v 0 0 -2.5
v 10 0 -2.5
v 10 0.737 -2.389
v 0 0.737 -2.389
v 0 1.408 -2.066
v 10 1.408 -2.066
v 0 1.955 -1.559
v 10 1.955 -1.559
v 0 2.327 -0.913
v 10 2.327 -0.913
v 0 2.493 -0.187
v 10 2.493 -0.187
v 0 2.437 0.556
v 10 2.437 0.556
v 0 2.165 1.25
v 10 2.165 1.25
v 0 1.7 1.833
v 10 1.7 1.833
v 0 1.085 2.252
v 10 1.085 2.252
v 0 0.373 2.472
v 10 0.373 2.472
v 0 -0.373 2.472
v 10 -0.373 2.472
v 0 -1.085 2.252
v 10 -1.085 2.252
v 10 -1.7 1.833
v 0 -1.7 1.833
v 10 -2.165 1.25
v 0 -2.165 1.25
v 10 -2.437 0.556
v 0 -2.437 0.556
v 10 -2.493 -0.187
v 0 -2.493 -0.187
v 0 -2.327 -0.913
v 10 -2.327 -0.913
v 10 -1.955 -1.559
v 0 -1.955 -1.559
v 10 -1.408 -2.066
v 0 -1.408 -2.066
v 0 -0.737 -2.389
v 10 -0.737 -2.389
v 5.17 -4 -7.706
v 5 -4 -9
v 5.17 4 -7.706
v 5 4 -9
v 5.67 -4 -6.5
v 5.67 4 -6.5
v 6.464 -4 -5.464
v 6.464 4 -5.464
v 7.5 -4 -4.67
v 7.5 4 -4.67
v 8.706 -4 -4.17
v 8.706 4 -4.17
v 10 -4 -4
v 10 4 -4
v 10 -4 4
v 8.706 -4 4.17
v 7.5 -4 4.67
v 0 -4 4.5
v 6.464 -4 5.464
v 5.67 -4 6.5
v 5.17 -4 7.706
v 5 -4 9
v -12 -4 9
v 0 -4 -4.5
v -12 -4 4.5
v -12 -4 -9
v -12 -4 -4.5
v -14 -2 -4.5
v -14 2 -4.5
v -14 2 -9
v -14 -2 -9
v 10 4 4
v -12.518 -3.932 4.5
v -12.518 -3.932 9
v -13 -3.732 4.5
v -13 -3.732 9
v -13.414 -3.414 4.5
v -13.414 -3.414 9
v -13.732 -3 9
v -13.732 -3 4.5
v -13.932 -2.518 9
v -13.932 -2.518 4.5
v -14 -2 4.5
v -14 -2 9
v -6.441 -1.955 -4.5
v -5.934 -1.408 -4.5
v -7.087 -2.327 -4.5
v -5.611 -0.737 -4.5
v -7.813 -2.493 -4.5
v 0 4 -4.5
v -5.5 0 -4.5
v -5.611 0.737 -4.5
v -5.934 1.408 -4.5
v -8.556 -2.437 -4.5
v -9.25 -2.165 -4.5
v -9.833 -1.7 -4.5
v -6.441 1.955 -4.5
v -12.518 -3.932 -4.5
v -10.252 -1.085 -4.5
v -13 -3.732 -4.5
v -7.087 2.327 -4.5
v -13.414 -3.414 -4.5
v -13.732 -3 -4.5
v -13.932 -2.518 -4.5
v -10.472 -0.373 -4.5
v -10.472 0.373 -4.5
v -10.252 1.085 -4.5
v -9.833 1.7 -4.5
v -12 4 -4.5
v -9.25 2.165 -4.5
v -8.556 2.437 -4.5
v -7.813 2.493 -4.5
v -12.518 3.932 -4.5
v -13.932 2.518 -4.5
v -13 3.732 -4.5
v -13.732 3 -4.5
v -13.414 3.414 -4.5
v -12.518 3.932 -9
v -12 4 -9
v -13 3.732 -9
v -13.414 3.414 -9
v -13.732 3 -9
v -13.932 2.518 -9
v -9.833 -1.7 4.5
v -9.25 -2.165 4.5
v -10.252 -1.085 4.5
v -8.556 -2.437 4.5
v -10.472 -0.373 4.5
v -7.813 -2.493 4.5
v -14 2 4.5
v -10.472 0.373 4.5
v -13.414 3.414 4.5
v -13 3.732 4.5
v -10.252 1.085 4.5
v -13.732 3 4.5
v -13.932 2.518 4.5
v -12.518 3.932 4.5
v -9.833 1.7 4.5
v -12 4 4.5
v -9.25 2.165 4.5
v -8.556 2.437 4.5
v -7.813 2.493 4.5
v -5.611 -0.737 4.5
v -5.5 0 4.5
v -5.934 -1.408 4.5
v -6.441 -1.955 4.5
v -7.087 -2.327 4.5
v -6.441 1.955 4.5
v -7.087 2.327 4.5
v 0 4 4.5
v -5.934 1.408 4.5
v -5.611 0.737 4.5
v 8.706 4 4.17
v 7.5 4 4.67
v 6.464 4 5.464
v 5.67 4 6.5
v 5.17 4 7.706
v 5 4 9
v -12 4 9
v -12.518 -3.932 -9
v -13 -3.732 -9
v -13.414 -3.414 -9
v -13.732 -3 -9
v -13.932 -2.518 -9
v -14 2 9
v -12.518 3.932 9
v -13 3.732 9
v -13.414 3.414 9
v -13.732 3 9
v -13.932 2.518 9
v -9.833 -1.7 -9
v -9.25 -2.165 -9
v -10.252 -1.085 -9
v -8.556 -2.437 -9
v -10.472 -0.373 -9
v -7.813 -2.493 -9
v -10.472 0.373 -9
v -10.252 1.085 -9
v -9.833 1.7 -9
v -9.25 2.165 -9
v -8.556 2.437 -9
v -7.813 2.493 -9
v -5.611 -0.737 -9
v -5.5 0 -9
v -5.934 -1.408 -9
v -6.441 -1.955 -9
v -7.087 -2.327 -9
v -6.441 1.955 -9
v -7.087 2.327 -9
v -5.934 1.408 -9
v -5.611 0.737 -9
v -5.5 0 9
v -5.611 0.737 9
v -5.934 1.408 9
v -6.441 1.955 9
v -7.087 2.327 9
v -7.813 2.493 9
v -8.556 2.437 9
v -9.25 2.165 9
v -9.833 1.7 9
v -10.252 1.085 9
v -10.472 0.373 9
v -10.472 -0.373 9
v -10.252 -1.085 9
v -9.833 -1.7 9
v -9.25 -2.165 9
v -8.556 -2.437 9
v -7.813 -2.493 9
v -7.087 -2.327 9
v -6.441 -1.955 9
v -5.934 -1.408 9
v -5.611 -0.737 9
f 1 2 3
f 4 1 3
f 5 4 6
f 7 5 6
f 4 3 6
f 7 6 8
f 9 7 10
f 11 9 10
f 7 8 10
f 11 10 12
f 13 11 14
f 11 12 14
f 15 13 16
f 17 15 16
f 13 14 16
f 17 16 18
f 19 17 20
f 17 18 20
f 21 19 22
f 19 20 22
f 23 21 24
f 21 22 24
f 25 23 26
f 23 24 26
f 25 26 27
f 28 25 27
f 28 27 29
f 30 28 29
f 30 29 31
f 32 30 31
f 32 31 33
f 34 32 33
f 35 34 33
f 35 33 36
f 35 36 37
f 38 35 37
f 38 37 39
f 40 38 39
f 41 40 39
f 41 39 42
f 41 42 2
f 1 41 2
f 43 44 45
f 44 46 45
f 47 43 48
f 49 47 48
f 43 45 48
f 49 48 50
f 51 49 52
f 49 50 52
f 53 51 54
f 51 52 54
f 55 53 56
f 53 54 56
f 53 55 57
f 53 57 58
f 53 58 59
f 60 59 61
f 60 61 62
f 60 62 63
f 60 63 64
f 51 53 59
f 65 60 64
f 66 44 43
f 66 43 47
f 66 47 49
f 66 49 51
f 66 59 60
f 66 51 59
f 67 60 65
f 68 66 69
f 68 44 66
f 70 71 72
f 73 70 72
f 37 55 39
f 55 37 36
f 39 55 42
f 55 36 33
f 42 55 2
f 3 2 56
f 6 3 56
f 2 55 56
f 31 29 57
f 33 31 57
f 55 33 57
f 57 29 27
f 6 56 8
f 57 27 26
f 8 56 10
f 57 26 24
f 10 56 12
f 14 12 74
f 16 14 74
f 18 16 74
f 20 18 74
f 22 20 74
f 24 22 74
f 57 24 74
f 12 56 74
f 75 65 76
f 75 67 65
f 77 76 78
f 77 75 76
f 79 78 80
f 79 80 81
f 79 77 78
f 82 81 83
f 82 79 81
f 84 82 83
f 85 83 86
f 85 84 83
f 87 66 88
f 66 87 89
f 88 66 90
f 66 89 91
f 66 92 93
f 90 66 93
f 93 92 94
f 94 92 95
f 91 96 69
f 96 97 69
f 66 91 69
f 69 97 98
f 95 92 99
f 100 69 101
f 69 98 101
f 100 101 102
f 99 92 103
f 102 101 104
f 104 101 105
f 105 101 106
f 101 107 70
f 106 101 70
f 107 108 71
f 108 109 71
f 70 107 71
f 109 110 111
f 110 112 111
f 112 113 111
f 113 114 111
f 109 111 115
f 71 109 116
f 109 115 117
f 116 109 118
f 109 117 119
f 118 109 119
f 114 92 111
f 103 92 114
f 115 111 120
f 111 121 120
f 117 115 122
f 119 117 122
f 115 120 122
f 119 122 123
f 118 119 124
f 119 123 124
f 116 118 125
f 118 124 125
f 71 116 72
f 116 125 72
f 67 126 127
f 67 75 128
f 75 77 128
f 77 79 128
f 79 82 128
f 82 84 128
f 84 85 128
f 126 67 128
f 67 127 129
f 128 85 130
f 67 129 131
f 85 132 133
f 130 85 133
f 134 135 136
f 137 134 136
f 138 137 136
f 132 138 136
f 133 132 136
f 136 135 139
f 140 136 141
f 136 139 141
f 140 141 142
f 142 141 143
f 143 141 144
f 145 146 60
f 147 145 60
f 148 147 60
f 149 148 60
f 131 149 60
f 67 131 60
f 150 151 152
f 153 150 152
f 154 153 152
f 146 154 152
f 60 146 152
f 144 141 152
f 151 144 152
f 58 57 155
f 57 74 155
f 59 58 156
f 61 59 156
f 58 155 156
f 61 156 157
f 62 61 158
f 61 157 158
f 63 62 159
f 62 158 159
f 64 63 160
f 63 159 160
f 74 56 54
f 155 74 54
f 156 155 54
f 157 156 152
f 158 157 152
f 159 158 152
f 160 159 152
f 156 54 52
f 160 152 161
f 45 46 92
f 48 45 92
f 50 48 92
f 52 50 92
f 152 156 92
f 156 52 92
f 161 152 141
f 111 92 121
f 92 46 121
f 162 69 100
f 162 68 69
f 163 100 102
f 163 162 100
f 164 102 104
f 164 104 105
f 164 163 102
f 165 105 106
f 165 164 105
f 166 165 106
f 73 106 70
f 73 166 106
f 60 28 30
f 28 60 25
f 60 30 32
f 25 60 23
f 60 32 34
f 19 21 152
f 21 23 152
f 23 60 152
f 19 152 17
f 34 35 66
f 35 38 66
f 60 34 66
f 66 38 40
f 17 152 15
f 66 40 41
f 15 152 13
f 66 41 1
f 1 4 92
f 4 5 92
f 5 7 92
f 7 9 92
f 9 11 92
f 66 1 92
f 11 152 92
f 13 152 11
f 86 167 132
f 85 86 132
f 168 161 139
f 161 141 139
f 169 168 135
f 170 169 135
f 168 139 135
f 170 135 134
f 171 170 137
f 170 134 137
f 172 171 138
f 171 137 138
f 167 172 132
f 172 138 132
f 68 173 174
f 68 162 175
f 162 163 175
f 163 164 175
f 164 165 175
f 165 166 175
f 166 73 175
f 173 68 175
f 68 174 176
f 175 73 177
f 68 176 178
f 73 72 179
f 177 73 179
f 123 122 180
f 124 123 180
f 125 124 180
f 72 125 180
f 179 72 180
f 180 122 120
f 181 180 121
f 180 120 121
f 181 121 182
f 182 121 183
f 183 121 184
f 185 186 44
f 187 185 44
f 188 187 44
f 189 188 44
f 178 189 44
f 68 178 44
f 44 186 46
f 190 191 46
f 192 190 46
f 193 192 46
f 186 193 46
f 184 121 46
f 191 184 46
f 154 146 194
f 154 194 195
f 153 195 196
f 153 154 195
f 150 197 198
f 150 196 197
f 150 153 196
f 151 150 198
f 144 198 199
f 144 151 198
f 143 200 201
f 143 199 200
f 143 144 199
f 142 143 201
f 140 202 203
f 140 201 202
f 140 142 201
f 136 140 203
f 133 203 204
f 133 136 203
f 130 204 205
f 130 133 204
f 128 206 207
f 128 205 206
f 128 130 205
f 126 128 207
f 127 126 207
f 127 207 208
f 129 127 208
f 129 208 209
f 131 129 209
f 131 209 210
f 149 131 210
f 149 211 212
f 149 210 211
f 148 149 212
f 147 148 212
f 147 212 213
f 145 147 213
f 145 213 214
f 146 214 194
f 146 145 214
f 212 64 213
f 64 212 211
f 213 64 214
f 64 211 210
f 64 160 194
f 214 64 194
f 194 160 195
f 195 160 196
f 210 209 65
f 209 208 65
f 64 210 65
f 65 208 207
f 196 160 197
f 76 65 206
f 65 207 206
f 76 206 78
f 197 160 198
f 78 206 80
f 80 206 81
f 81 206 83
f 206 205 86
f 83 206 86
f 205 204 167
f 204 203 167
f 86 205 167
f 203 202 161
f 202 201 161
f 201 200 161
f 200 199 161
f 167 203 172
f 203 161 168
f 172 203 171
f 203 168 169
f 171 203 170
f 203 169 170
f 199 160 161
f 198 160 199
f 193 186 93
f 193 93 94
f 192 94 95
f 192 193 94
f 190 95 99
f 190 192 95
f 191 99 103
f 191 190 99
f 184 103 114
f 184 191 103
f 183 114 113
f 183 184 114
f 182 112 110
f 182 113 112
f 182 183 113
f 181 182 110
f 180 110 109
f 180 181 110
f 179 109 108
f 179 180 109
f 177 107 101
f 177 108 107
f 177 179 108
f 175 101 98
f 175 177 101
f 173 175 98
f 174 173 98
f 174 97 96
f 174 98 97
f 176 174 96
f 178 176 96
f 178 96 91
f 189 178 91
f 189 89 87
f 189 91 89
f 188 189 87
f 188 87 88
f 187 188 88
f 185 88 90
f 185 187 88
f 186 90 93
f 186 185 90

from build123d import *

# Parameters (mm, degrees)
BOSS_EXTRUDE1_DEPTH     = 4
SKETCH3_R               = 2.5
CUT_EXTRUDE1_DEPTH      = 26.942243542
CUT_EXTRUDE2_DEPTH      = 18.117242769
CUT_EXTRUDE2_DEPTH_BACK = 18.117242769
SKETCH4_R               = 2.5
FILLET1_R               = 2


with BuildPart() as part:
    # Sketch2 → Boss-Extrude1 (new, symmetric)
    with BuildSketch(Plane(origin=(0, 0, 0), x_dir=(1, 0, 0), z_dir=(0, 1, 0))):
        with BuildLine():
            Line((0, 4.5), (-14, 4.5))
            Line((-14, 4.5), (-14, 9))
            Line((-14, 9), (5, 9))
            ThreePointArc((5, 9), (6.464466094, 5.464466094), (10, 4))
            Line((10, 4), (10, -4))
            ThreePointArc((10, -4), (6.464466094, -5.464466094), (5, -9))
            Line((5, -9), (-14, -9))
            Line((-14, -9), (-14, -4.5))
            Line((-14, -4.5), (0, -4.5))
            Line((0, -4.5), (0, 4.5))
        make_face()
    extrude(amount=BOSS_EXTRUDE1_DEPTH, both=True)

    # Sketch3 → Cut-Extrude1 (cut, through all)
    with BuildSketch(Plane(origin=(10, 0, 0), x_dir=(0, 0, -1), z_dir=(1, 0, 0))):
        Circle(SKETCH3_R)
    extrude(amount=-CUT_EXTRUDE1_DEPTH, mode=Mode.SUBTRACT)

    # Sketch4 → Cut-Extrude2 (cut, two sides: drawn at the far end of the back side and taken through both)
    with BuildSketch(Plane.XY.offset(-CUT_EXTRUDE2_DEPTH_BACK)):
        with Locations((-8, 0)):
            Circle(SKETCH4_R)
    extrude(amount=CUT_EXTRUDE2_DEPTH + CUT_EXTRUDE2_DEPTH_BACK, mode=Mode.SUBTRACT)

    # Fillet1
    fillet1_edges = [part.edges().sort_by_distance(p)[0] for p in [
        (-14, -4, -6.75),
        (-14, 4, 6.75),
        (-14, -4, 6.75),
        (-14, 4, -6.75),
    ]]
    fillet(fillet1_edges, radius=FILLET1_R)


solid = part.part
